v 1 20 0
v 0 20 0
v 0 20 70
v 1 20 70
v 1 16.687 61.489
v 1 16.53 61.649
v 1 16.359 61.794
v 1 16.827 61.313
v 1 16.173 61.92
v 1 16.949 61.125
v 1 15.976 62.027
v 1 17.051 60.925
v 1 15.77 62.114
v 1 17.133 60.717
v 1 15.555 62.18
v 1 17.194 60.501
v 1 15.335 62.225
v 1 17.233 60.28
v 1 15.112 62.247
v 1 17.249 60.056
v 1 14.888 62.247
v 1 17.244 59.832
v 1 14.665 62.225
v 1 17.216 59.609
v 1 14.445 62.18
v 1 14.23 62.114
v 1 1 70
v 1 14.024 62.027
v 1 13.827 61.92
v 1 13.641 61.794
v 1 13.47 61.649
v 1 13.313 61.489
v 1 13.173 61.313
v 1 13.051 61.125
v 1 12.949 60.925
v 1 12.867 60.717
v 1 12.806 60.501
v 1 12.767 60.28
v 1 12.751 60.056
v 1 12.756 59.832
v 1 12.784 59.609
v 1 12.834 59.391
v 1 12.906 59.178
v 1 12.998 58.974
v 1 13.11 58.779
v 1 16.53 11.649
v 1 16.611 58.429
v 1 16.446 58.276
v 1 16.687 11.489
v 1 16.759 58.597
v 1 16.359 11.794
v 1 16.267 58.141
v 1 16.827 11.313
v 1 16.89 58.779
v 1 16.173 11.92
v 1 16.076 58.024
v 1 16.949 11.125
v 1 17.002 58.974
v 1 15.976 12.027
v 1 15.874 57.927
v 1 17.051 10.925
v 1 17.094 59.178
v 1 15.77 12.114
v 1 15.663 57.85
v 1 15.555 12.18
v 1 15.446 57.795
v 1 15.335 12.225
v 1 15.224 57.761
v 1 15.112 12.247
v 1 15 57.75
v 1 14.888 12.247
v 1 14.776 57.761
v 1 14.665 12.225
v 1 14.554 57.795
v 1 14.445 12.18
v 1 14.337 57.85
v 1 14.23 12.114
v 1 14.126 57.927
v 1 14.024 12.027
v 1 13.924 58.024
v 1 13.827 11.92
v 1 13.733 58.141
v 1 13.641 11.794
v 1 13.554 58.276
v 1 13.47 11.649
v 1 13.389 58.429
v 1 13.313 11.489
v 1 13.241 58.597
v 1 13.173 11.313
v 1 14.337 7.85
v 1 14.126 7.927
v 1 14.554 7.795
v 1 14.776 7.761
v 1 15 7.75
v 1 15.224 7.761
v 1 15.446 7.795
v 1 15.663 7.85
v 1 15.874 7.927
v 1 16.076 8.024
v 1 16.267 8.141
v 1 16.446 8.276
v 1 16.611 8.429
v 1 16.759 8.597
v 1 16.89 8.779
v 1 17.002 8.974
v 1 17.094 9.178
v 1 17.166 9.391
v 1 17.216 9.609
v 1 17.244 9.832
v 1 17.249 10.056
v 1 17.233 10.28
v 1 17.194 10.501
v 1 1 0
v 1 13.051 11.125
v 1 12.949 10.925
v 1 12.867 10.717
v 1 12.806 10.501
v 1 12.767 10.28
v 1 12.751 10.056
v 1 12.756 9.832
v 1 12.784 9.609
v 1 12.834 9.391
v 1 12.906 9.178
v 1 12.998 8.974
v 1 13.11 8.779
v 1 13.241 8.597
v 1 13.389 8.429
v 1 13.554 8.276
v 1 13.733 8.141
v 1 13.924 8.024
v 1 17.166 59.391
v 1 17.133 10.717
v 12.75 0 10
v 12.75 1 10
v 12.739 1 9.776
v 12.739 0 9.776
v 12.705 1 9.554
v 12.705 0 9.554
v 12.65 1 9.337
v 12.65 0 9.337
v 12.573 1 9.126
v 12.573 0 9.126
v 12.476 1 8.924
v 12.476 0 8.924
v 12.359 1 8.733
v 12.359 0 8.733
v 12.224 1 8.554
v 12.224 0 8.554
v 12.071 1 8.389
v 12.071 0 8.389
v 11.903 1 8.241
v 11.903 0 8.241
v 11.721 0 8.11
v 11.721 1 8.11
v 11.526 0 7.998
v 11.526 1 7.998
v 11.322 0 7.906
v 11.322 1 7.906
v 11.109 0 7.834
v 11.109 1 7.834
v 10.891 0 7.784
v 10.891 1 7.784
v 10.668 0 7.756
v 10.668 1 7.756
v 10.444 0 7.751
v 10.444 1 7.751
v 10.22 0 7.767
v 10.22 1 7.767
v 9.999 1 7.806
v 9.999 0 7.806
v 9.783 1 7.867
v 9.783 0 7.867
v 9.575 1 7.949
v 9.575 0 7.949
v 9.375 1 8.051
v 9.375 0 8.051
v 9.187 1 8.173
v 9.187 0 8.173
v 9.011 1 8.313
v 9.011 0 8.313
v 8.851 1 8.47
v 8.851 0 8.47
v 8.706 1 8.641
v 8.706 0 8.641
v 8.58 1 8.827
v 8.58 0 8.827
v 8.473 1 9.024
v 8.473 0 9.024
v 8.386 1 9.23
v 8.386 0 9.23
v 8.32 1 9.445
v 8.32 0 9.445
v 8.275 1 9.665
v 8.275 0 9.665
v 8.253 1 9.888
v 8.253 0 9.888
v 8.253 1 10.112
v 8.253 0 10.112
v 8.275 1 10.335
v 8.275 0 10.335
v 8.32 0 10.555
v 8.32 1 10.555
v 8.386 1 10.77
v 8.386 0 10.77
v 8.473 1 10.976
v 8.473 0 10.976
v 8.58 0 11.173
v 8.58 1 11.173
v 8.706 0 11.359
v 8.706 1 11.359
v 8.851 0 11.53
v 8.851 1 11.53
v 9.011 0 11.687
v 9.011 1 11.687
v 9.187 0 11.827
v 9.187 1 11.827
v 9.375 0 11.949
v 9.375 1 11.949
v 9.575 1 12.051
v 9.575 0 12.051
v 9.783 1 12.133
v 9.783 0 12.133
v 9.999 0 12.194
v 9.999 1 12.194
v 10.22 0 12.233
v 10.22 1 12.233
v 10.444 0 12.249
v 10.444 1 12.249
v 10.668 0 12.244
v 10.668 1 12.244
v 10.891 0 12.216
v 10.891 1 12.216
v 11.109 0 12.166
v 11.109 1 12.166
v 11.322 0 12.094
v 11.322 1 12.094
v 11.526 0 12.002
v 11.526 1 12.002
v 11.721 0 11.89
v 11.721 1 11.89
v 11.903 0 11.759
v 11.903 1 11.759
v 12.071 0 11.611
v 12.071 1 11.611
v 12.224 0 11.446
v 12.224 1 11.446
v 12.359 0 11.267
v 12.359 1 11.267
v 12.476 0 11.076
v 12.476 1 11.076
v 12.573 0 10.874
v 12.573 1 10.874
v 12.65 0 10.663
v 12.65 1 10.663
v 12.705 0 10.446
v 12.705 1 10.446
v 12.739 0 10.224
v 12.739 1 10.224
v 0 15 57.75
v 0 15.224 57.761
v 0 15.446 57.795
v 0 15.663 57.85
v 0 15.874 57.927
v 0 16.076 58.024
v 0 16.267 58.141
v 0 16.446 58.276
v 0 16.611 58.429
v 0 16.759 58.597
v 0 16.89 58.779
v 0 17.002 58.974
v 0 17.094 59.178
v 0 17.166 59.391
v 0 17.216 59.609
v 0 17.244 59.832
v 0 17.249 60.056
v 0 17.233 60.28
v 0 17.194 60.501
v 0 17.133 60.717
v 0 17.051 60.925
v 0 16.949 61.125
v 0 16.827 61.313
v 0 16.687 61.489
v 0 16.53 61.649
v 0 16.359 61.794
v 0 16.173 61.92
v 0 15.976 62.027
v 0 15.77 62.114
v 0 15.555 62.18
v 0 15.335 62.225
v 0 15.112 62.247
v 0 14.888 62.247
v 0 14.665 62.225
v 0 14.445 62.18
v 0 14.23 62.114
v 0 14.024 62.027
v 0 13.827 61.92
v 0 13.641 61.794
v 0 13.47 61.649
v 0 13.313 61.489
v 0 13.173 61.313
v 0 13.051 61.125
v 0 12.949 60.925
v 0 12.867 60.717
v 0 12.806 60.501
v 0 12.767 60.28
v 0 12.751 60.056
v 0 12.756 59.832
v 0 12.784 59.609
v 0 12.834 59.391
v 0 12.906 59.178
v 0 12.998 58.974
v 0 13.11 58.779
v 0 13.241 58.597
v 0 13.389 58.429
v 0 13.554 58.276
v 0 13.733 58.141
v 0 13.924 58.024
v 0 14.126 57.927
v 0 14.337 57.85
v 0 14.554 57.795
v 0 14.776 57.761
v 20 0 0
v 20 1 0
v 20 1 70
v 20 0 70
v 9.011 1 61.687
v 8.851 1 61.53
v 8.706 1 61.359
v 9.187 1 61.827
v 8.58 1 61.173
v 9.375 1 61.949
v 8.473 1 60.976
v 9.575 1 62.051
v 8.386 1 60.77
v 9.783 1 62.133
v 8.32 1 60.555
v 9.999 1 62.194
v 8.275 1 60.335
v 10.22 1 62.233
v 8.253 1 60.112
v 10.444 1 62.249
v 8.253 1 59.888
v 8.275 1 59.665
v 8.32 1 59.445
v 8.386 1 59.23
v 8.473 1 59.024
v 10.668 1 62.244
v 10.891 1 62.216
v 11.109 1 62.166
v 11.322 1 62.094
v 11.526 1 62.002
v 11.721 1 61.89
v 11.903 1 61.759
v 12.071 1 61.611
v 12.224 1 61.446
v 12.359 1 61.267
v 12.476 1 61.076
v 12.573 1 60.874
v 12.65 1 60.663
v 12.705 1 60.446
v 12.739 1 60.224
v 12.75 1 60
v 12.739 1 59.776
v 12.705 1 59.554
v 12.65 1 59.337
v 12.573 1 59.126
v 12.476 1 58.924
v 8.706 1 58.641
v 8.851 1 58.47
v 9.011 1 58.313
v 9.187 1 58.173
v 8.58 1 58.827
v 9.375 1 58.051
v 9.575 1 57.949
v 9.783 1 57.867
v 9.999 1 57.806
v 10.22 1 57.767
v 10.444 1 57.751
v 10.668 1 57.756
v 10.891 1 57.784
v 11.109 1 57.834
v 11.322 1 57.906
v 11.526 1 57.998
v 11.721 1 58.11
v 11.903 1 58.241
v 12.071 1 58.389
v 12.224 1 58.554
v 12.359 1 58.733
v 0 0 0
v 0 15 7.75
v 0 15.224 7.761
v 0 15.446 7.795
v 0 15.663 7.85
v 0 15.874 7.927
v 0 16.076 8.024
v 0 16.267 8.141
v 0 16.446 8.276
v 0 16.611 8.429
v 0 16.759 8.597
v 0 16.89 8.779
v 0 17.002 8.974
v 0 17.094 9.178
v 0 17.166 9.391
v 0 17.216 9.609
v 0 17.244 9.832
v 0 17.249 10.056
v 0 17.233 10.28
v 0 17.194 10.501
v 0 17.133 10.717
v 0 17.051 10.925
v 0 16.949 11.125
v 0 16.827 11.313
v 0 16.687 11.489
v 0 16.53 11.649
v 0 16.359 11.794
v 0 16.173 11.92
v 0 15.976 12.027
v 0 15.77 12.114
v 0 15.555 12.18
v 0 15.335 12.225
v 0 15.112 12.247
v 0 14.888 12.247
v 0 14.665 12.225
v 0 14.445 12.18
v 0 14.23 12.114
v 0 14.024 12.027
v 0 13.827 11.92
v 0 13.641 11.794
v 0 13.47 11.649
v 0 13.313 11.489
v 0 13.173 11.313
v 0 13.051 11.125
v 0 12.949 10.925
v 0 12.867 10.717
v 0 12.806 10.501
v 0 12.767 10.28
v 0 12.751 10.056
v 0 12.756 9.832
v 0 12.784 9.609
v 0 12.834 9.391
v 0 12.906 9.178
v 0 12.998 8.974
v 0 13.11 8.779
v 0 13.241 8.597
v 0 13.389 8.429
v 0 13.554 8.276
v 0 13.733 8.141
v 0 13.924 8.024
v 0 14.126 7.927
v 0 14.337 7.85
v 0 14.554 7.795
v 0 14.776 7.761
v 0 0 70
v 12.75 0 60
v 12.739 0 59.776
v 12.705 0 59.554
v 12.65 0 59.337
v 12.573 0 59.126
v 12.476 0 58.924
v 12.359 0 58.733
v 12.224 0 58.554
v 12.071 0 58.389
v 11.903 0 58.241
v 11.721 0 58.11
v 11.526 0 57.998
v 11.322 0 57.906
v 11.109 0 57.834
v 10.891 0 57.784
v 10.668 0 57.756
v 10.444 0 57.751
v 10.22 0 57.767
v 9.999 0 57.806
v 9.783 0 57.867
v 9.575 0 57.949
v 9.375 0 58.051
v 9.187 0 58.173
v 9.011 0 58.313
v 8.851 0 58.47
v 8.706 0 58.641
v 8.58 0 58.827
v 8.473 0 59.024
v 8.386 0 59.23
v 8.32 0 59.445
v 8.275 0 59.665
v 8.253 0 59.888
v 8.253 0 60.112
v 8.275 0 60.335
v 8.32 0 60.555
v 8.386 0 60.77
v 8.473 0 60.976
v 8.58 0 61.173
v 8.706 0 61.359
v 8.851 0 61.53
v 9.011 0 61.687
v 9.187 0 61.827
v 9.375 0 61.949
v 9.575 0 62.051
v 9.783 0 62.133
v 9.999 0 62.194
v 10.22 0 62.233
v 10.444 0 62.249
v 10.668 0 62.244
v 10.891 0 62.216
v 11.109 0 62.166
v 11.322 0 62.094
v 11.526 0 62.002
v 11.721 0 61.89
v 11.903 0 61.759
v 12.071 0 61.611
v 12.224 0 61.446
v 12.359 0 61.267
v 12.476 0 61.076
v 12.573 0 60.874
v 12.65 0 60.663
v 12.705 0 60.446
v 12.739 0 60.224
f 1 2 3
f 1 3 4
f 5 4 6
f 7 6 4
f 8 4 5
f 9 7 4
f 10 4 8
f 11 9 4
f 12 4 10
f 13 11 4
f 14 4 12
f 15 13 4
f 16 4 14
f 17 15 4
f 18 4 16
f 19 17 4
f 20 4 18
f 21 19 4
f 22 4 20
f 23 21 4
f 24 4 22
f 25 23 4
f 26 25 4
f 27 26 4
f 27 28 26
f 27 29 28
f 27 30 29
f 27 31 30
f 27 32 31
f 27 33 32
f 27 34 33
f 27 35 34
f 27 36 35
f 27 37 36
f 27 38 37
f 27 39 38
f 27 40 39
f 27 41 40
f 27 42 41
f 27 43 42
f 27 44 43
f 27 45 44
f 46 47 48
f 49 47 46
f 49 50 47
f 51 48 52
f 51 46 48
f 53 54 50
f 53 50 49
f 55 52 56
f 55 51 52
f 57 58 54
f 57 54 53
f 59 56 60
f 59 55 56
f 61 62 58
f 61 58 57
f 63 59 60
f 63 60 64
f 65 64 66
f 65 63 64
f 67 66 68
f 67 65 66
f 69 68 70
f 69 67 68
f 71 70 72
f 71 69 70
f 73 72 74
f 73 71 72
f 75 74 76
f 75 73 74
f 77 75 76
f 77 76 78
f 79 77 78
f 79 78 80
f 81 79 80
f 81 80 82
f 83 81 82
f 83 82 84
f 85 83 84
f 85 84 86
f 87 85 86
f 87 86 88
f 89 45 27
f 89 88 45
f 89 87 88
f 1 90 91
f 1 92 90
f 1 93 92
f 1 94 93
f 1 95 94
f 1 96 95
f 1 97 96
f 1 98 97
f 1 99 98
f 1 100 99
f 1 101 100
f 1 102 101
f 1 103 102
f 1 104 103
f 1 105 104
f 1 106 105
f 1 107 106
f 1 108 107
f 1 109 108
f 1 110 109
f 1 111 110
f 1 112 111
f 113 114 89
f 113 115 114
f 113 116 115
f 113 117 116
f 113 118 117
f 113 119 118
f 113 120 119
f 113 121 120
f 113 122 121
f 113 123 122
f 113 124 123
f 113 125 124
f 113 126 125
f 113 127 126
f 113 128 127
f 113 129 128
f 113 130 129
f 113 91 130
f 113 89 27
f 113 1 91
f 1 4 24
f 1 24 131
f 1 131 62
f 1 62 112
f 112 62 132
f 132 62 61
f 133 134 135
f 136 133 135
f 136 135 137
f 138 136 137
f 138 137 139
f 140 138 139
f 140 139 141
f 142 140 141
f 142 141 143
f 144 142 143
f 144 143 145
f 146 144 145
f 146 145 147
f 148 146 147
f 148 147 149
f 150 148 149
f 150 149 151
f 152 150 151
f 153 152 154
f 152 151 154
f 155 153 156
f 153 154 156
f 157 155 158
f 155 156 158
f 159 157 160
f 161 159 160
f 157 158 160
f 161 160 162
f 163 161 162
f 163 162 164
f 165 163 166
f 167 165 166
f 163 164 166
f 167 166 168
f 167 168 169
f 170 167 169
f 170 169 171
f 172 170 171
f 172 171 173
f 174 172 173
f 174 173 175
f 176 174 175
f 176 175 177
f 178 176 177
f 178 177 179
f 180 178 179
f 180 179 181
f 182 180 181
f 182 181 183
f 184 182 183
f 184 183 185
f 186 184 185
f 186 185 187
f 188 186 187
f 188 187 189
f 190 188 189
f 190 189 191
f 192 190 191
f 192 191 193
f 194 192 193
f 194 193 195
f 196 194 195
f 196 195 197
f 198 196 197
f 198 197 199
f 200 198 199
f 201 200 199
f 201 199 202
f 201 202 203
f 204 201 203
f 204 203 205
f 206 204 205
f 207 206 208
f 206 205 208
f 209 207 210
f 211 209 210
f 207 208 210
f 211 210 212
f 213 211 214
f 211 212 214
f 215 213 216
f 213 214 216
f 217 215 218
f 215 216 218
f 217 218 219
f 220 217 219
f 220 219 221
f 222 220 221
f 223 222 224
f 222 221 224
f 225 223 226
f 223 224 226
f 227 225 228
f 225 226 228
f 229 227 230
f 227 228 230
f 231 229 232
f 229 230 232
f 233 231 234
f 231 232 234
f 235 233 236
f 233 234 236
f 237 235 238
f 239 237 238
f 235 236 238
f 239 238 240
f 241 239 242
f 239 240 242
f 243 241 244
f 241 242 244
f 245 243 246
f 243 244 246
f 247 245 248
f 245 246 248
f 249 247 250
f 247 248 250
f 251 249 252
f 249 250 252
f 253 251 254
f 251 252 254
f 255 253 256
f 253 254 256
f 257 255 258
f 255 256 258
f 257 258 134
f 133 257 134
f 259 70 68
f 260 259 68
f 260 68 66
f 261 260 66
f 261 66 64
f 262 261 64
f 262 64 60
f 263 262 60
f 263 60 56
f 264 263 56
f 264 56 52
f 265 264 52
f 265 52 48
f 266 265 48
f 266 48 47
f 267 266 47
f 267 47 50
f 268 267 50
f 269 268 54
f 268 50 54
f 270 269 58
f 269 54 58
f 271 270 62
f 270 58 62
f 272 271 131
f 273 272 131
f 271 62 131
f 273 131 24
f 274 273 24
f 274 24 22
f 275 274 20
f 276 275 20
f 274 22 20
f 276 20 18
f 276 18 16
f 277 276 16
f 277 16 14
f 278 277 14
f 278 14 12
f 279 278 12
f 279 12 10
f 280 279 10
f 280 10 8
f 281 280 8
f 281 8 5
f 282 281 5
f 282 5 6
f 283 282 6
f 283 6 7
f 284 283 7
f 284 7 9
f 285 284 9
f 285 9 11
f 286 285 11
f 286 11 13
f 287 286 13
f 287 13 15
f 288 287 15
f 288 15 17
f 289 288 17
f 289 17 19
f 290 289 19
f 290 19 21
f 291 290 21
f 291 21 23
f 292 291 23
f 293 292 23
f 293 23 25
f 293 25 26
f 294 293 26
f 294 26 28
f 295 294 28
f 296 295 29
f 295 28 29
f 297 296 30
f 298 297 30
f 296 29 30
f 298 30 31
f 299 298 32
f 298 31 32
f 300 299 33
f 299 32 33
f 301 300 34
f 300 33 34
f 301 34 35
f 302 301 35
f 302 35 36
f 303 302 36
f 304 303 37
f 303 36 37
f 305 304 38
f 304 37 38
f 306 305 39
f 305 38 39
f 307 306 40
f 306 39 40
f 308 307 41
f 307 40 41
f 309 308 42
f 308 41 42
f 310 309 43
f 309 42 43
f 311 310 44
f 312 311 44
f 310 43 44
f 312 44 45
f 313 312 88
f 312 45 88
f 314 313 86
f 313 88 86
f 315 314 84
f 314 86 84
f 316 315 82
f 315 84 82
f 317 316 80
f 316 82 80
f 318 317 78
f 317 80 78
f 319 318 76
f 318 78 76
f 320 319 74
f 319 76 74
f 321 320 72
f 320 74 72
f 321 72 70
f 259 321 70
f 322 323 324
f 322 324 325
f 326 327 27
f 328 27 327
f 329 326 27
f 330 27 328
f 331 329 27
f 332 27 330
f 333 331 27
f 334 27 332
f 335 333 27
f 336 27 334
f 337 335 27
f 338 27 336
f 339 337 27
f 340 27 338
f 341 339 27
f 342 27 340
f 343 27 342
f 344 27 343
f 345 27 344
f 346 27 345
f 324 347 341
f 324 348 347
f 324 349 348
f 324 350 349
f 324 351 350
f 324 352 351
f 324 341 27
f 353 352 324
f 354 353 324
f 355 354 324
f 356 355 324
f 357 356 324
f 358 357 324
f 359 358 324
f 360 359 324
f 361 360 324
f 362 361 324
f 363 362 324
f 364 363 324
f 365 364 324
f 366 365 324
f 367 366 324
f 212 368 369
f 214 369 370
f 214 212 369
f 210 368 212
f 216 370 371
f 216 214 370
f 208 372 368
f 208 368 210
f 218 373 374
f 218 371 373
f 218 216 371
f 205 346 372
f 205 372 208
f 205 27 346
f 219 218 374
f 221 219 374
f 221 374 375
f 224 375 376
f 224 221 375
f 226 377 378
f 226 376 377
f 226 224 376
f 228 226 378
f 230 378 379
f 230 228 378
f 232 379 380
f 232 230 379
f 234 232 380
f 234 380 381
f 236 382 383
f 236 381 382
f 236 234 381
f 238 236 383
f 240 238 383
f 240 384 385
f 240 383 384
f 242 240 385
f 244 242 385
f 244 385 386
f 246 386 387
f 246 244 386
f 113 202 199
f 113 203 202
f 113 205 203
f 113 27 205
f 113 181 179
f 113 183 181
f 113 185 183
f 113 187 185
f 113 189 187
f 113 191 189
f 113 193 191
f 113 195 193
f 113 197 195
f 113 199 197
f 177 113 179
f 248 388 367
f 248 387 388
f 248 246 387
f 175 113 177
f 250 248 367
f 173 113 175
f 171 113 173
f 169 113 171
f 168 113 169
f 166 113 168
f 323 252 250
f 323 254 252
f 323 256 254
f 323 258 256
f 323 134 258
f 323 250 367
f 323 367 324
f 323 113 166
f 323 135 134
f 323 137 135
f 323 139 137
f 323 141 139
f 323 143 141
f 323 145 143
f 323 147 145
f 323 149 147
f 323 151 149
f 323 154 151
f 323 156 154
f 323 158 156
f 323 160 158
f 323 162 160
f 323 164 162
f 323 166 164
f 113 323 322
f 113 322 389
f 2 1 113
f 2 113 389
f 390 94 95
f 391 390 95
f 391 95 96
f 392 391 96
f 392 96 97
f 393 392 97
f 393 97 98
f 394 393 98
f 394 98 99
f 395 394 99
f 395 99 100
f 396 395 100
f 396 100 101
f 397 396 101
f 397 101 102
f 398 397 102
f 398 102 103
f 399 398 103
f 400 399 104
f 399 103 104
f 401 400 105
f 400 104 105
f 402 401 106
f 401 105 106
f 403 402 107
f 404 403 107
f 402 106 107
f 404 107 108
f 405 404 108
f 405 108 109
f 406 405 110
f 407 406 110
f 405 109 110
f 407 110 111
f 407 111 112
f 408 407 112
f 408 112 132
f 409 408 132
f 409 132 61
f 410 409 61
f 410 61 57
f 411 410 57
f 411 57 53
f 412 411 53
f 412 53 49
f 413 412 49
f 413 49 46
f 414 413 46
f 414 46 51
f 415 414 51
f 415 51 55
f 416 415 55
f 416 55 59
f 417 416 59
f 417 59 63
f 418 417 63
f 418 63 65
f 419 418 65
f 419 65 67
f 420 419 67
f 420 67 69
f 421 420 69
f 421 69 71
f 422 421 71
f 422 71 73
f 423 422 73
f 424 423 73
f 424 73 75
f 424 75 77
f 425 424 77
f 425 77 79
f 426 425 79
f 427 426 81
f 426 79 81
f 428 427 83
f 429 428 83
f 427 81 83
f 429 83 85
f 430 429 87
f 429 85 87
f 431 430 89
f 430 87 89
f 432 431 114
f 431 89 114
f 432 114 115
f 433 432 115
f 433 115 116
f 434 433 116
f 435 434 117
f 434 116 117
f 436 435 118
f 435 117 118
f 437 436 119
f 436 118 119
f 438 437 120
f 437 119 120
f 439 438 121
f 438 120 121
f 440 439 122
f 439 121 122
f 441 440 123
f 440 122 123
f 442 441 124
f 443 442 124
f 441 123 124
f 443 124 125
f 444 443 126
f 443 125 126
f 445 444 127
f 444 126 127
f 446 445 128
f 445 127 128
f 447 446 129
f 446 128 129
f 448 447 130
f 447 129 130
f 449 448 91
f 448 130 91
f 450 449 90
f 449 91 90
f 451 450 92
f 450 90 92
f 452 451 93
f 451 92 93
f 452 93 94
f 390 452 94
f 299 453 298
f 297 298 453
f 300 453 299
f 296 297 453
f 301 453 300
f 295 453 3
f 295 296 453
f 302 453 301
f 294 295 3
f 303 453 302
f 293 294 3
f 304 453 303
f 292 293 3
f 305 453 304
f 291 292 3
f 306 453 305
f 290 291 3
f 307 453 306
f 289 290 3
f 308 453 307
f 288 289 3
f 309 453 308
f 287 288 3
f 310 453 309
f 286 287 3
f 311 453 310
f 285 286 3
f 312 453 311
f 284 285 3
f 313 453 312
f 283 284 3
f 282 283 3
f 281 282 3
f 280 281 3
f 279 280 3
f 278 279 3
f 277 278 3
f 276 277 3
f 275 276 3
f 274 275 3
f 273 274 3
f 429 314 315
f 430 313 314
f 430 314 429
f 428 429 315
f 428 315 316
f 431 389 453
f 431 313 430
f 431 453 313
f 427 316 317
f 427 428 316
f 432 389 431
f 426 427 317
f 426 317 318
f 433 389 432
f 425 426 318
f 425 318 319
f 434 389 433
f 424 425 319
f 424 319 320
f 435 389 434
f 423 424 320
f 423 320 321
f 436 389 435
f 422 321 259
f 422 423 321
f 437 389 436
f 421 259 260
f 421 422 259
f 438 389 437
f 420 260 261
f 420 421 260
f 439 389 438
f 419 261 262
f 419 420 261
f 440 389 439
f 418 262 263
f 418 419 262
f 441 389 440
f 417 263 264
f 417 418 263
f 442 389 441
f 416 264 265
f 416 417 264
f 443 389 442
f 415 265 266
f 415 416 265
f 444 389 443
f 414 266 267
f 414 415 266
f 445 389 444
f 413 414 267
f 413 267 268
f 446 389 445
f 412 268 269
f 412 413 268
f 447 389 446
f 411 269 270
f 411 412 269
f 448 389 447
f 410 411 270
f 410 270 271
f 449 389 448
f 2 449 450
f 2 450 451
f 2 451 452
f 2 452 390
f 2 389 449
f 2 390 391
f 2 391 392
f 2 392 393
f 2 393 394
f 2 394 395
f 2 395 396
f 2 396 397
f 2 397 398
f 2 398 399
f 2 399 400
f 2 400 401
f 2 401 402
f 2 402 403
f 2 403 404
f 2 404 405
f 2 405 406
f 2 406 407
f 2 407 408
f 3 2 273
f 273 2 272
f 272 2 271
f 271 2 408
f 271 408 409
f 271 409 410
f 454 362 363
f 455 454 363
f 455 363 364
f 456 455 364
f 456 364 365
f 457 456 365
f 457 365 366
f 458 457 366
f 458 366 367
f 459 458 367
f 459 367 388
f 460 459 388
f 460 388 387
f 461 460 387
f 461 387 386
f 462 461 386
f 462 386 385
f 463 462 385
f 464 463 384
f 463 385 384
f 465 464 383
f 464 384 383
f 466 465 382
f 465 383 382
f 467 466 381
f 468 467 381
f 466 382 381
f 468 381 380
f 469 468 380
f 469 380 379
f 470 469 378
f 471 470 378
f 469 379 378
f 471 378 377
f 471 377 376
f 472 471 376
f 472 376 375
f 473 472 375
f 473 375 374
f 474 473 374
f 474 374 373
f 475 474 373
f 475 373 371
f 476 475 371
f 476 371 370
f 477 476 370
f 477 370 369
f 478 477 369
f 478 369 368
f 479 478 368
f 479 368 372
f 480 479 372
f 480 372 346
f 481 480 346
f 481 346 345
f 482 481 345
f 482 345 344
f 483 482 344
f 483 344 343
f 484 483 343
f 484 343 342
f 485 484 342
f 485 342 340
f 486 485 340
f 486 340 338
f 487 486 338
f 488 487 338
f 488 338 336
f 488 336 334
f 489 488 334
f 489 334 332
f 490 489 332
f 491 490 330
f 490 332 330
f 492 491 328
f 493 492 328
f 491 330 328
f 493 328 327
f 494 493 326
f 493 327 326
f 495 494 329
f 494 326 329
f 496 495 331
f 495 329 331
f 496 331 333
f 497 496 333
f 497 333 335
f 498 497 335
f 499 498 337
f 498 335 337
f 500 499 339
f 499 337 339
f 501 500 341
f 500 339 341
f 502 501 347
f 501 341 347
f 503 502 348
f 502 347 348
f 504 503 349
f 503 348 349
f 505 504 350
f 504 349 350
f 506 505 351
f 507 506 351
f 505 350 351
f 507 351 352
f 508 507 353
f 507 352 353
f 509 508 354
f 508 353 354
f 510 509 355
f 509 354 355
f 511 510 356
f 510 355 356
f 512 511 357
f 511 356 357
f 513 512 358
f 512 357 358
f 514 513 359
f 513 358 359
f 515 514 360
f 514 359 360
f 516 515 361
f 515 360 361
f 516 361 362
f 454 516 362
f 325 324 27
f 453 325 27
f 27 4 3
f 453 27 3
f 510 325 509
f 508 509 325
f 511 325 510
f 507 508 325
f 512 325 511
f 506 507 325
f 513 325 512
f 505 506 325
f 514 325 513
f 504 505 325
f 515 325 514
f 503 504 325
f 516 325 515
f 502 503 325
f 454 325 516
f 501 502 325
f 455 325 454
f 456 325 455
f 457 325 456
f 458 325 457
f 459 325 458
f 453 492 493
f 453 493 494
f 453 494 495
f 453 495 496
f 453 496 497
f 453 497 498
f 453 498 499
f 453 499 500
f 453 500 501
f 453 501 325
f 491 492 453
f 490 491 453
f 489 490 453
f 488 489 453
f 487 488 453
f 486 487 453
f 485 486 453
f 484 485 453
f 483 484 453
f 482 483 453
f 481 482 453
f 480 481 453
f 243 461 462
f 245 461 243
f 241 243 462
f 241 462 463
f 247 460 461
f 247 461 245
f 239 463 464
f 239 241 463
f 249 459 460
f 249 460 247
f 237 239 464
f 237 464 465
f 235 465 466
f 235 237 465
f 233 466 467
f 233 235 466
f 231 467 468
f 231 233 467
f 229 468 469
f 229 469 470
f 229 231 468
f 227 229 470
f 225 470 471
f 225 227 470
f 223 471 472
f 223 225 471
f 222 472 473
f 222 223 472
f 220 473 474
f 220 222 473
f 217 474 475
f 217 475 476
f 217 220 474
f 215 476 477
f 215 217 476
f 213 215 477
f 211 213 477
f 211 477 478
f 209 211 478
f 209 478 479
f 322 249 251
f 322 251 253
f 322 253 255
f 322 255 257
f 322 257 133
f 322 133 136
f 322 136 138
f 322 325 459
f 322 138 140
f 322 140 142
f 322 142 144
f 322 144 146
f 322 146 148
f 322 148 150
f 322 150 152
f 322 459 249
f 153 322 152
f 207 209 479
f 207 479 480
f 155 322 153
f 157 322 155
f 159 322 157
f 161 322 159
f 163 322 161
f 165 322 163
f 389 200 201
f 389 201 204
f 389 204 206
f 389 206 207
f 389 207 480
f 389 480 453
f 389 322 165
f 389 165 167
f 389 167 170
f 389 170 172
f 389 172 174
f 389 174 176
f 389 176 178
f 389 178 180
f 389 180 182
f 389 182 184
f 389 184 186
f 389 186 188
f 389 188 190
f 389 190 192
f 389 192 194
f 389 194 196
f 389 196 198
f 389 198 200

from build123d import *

# Parameters (mm, degrees)
EXTRUDE_1_DEPTH     = 70
SKETCH_2_R          = 2.25
CUT_EXTRUDE_1_DEPTH = 2
SKETCH_3_R          = 2.25
CUT_EXTRUDE_2_DEPTH = 2


with BuildPart() as part:
    # Эскиз1 → Бобышка-Вытянуть1 (new body)
    with BuildSketch(Plane.XY):
        Polygon((0, 0), (0, 20), (1, 20), (1, 1), (20, 1), (20, 0), align=None)
    extrude(amount=EXTRUDE_1_DEPTH)

    # Эскиз2 → Вырез-Вытянуть1 (cut, through all)
    with BuildSketch(Plane(origin=(0, 1, 0), x_dir=(1, 0, 0), z_dir=(0, 1, 0))):
        with Locations((10.5, -10)):
            Circle(SKETCH_2_R)
        with Locations((10.5, -60)):
            Circle(SKETCH_2_R)
    extrude(amount=-CUT_EXTRUDE_1_DEPTH, mode=Mode.SUBTRACT)

    # Эскиз3 → Вырез-Вытянуть2 (cut, through all)
    with BuildSketch(Plane(origin=(1, 0, 0), x_dir=(0, 0, -1), z_dir=(1, 0, 0))):
        with Locations((-10, 15)):
            Circle(SKETCH_3_R)
        with Locations((-60, 15)):
            Circle(SKETCH_3_R)
    extrude(amount=-CUT_EXTRUDE_2_DEPTH, mode=Mode.SUBTRACT)


solid = part.part
